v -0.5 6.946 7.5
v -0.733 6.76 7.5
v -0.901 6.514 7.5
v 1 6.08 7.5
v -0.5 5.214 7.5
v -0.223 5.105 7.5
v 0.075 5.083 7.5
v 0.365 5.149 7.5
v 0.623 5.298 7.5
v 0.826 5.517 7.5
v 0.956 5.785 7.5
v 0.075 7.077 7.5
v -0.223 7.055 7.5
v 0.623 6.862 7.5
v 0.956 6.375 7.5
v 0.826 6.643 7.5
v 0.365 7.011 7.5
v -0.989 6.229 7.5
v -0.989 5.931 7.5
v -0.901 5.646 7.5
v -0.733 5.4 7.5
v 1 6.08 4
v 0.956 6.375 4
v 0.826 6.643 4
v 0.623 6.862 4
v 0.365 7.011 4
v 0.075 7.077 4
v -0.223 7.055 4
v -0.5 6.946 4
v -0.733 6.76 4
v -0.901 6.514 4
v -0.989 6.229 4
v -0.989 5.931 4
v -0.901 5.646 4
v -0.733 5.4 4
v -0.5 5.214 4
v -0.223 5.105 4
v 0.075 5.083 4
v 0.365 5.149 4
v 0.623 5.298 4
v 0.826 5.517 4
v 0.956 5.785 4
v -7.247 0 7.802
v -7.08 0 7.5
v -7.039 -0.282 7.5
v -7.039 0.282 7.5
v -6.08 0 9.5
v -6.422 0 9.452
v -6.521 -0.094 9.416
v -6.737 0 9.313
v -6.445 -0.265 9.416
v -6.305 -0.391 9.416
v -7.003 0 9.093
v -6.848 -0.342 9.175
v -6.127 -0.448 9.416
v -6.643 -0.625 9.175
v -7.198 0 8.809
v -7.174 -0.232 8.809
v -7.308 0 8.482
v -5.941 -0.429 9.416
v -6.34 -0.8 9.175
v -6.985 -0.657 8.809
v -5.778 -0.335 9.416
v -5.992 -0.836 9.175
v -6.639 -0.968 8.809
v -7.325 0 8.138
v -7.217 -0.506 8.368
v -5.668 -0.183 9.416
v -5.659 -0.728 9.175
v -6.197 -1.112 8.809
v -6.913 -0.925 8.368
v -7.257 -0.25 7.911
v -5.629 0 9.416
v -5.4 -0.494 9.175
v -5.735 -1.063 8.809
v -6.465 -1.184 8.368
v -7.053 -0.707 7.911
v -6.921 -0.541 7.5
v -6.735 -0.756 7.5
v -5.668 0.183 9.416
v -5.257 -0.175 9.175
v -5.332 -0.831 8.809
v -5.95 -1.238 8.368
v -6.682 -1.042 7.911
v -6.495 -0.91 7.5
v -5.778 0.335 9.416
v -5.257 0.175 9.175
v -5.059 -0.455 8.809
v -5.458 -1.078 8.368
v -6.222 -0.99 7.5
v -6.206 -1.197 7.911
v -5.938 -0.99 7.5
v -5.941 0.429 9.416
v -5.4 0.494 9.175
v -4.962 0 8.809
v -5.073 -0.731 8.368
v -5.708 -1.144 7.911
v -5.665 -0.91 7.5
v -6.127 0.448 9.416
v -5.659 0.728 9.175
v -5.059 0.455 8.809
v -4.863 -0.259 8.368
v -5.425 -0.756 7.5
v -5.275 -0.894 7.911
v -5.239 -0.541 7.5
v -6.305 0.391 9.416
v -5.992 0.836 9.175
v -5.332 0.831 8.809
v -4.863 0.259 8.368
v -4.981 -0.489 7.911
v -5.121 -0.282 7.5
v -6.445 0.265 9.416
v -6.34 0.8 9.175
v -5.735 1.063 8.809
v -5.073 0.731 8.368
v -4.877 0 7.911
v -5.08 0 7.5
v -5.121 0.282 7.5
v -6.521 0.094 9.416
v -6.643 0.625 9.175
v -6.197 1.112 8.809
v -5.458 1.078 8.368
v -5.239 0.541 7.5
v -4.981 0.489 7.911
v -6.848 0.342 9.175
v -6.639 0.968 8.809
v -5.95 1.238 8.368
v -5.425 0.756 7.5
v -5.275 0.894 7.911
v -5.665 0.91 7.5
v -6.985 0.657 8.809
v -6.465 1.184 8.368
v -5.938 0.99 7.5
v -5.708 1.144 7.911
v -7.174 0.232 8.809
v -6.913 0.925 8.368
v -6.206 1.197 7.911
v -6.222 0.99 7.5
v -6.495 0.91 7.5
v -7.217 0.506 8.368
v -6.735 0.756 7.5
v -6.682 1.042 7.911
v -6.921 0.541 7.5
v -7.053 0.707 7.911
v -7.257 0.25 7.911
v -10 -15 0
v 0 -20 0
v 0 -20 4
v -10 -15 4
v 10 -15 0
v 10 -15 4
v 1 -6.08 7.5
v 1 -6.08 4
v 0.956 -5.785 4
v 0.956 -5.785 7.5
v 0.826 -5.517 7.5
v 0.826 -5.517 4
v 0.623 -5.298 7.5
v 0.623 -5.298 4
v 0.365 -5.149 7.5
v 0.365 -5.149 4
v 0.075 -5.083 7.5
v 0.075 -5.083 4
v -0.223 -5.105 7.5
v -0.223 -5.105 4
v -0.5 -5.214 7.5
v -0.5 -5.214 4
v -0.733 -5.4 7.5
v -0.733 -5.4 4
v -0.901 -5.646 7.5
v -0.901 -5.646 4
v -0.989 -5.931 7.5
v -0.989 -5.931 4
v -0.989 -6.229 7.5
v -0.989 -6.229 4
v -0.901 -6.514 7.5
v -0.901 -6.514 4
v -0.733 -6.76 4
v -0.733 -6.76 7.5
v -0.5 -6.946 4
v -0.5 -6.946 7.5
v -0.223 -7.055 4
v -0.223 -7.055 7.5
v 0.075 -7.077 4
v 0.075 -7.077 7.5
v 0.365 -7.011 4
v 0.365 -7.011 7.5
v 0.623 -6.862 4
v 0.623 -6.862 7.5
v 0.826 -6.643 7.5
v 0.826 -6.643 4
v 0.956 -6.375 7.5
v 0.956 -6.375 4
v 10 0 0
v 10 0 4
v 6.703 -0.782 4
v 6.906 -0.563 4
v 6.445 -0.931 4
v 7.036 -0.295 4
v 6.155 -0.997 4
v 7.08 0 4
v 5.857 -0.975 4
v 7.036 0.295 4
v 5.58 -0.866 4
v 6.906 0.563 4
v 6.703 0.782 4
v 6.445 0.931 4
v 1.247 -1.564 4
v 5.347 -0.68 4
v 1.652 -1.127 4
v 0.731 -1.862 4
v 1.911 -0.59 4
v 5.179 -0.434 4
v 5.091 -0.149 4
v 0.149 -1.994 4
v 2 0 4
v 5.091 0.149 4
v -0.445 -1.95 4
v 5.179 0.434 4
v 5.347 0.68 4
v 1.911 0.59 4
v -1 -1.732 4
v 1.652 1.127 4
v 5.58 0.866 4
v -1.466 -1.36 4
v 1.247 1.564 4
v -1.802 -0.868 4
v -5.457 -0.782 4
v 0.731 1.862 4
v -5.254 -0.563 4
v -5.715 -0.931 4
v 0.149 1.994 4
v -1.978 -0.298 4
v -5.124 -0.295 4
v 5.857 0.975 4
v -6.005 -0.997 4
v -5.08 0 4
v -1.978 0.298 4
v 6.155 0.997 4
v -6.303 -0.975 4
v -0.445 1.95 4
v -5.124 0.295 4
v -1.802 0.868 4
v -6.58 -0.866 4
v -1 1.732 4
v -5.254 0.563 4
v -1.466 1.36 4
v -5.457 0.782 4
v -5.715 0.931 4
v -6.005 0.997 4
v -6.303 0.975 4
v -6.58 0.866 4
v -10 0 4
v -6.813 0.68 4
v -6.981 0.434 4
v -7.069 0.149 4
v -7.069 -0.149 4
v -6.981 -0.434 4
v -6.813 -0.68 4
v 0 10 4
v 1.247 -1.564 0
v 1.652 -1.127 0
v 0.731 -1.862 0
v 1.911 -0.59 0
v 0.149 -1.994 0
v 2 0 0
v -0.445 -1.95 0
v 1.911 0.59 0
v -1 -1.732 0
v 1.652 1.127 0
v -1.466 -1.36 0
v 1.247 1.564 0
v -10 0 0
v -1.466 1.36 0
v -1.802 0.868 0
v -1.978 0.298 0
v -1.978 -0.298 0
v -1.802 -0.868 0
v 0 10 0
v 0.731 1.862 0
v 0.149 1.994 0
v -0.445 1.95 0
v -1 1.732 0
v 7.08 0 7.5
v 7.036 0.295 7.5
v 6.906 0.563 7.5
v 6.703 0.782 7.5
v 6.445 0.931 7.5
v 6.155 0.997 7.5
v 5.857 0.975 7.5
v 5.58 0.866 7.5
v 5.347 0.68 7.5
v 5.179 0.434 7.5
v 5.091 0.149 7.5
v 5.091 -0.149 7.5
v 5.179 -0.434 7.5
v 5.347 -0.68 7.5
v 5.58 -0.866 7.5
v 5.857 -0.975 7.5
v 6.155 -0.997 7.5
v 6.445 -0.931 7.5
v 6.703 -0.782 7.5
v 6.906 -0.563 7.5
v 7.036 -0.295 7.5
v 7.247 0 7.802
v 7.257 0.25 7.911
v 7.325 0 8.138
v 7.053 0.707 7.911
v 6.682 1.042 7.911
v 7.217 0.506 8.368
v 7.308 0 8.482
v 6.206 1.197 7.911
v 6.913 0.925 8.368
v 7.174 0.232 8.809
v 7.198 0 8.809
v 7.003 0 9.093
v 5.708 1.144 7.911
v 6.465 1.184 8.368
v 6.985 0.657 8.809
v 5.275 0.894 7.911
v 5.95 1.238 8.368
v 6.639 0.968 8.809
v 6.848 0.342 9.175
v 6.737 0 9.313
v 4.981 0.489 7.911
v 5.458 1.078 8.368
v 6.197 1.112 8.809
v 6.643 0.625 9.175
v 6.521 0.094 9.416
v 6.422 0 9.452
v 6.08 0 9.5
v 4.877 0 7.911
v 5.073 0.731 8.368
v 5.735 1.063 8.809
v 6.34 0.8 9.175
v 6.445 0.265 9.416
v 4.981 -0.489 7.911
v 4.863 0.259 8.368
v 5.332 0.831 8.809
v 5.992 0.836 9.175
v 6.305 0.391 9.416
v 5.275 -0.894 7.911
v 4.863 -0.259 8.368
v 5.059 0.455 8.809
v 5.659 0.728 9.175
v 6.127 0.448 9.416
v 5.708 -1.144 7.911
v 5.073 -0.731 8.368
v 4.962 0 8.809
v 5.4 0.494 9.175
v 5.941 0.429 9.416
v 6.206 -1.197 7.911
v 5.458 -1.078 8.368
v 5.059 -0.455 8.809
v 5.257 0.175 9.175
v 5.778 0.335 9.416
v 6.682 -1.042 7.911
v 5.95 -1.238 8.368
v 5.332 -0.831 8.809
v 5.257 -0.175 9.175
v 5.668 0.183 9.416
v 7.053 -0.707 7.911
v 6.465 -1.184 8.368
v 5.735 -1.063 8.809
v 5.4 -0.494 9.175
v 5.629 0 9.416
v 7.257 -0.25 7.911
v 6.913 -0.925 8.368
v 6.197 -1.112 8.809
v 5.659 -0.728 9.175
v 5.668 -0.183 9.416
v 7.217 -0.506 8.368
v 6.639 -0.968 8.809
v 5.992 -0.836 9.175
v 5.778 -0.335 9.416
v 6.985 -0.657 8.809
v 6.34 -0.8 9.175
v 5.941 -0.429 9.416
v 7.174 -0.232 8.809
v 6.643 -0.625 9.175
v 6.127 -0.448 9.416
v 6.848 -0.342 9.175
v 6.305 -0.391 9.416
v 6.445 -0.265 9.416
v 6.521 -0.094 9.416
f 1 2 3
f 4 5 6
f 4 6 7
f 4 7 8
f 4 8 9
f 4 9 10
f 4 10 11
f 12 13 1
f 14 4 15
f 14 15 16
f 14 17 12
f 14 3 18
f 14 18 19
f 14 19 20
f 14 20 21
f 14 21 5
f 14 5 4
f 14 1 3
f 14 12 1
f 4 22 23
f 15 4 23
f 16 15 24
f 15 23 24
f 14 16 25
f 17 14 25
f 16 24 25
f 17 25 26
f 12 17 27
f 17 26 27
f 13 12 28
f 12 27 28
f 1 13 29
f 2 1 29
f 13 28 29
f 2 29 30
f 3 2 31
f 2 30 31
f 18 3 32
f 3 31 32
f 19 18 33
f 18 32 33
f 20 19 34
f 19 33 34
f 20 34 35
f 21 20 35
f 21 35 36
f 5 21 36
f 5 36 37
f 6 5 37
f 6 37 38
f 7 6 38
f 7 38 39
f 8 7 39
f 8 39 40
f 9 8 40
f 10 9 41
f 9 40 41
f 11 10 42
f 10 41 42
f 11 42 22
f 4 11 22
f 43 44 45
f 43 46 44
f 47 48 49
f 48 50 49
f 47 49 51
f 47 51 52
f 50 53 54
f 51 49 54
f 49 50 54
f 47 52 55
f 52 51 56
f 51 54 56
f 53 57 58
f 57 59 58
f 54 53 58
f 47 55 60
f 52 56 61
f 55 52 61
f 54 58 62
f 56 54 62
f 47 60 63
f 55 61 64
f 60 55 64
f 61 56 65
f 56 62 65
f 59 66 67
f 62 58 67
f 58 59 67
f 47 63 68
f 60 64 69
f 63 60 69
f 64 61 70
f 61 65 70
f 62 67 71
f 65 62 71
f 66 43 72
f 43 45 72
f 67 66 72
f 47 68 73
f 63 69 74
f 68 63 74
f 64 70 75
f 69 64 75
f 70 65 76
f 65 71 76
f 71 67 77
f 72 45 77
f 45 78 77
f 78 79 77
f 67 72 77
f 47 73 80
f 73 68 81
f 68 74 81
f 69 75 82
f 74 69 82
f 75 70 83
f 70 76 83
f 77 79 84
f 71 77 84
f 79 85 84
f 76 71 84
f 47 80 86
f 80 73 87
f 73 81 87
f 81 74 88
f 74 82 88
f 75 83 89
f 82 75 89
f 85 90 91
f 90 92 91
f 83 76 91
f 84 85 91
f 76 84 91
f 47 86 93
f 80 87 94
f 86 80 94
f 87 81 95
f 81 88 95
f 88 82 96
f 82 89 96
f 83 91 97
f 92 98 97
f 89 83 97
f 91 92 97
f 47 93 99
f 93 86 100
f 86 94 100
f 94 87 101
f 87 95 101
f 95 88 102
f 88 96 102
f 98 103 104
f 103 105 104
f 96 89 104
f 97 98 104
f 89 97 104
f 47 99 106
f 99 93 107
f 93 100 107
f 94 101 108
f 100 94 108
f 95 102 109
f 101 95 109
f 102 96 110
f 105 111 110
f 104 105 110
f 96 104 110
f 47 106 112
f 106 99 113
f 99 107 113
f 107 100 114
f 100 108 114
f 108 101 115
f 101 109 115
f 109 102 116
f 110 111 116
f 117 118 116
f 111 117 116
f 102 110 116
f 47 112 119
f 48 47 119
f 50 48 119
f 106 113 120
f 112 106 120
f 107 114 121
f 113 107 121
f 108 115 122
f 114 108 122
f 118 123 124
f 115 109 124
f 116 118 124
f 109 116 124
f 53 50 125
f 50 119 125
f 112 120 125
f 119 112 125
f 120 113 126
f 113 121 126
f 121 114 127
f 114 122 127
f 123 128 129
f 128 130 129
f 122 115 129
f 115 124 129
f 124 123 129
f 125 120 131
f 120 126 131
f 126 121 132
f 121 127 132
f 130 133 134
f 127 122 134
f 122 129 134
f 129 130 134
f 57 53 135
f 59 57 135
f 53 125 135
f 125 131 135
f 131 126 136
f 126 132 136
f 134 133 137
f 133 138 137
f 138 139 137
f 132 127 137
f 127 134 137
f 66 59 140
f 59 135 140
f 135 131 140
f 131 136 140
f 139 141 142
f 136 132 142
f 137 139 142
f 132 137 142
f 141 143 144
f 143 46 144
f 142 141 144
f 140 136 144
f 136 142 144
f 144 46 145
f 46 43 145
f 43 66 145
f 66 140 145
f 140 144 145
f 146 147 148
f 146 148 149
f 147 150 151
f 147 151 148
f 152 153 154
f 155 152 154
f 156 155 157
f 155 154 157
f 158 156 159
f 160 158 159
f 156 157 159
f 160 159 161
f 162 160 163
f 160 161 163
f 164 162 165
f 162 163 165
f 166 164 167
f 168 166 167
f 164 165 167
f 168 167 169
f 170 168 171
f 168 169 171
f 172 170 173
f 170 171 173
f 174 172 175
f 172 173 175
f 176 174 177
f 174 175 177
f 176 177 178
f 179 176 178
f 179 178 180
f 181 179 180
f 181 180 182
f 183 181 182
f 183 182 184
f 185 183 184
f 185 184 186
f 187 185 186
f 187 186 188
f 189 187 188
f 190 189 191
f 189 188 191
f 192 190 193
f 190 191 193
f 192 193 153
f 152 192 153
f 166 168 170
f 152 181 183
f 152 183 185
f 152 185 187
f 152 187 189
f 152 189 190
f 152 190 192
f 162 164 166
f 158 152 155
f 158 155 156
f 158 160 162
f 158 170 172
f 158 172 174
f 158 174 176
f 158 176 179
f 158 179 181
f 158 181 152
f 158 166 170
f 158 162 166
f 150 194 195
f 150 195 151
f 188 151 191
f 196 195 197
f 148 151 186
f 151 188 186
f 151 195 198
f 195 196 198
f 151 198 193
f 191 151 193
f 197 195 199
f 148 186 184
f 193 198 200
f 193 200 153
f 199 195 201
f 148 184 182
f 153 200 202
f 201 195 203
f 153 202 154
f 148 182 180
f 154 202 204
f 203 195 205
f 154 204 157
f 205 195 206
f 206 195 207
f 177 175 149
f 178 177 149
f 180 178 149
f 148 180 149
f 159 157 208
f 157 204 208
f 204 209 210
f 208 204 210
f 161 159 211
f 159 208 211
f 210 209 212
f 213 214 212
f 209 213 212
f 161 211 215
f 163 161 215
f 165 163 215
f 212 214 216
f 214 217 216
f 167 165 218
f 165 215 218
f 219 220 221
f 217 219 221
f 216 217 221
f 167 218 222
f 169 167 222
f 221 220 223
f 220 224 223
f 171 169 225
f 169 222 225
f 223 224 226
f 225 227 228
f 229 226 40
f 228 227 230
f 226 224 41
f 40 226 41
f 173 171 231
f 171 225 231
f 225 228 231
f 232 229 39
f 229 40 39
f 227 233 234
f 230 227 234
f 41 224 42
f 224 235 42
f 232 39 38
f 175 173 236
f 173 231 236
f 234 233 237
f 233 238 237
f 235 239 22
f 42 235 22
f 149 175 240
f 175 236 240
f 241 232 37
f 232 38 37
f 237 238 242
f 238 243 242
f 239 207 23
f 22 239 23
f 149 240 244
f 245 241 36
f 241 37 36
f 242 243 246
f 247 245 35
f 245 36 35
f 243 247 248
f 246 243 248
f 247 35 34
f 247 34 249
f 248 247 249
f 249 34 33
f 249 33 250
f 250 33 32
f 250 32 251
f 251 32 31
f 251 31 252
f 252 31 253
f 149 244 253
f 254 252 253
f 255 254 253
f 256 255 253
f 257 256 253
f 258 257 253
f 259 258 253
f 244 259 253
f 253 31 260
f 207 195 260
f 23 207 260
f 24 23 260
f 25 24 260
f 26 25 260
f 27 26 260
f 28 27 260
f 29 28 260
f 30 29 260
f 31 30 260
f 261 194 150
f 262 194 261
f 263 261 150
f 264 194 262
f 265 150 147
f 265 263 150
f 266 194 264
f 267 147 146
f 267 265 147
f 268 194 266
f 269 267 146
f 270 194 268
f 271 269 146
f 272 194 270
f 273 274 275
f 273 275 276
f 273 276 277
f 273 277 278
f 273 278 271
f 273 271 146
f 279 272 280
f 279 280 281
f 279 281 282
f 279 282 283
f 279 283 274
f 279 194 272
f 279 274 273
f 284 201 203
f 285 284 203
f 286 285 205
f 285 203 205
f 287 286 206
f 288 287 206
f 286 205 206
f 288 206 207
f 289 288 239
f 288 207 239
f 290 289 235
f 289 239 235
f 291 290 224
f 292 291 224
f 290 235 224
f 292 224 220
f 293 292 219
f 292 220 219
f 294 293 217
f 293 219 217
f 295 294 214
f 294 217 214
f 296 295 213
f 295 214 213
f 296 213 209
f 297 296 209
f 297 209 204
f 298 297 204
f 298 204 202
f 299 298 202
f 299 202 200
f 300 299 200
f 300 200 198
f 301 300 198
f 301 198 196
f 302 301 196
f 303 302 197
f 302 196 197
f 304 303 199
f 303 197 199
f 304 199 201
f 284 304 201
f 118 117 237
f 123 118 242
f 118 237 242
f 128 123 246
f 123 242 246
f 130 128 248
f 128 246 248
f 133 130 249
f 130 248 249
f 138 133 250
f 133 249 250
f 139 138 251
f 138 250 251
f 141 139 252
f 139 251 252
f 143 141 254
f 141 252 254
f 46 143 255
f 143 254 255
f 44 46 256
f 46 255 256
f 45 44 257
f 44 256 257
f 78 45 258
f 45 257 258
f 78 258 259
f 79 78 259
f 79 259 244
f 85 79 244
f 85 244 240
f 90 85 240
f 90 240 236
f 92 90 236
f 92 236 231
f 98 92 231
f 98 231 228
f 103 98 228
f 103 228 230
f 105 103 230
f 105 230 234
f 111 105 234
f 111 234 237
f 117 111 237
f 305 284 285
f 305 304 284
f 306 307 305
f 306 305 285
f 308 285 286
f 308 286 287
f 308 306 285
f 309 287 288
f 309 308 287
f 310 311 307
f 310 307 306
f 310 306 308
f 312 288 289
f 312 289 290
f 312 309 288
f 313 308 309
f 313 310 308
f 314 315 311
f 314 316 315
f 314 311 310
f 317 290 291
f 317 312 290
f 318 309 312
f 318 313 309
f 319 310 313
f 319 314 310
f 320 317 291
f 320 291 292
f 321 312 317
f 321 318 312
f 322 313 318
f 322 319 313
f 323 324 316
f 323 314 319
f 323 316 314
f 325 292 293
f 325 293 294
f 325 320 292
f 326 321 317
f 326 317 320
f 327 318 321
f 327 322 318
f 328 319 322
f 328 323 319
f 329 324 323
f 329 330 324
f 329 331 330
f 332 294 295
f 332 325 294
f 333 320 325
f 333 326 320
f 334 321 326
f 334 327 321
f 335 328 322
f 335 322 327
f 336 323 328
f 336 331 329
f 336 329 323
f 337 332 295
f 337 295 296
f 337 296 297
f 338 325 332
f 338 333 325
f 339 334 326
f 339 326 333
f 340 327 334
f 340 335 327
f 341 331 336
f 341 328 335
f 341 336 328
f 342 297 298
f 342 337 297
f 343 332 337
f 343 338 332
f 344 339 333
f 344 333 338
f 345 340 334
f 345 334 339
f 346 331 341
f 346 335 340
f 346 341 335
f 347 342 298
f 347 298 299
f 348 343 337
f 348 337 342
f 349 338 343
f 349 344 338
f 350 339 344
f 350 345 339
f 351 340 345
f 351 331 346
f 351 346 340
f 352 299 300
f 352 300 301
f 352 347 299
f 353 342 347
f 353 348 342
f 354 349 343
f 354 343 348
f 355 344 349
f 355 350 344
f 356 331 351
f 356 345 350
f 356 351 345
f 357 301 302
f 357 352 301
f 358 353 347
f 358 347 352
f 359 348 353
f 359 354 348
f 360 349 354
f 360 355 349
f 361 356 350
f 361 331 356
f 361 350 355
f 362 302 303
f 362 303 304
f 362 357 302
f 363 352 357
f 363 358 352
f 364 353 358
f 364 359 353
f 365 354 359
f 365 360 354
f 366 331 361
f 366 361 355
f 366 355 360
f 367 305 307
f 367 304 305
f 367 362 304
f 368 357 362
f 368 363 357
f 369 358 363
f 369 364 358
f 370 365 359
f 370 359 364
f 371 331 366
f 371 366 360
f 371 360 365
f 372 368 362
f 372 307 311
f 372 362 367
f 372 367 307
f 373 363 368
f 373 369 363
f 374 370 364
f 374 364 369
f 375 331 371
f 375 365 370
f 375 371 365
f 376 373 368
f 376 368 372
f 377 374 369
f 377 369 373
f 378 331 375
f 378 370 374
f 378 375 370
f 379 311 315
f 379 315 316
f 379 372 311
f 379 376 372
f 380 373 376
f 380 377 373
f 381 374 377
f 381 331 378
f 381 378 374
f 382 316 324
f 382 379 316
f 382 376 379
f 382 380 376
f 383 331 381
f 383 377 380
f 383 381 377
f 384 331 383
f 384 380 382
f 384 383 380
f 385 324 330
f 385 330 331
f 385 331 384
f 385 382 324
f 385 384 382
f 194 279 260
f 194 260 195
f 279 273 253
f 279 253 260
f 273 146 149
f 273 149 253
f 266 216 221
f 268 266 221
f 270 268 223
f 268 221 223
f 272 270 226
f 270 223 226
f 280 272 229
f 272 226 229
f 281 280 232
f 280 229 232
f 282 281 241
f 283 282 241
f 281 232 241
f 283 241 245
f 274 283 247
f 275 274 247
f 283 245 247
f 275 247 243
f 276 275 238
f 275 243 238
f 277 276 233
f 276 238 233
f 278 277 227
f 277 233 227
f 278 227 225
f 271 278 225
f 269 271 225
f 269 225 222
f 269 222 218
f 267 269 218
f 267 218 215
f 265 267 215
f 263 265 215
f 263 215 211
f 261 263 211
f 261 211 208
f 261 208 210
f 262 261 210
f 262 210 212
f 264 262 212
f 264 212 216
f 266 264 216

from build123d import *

# Parameters (mm, degrees)
PAD_DEPTH    = 4
SKETCH001_R  = 2
POCKET_DEPTH = 5
SKETCH002_R  = 1
PAD001_DEPTH = 3.5


with BuildPart() as part:
    # Sketch → Pad (new body)
    with BuildSketch(Plane.XY):
        Polygon((-10, 0), (0, 10), (10, 0), (10, -15), (0, -20), (-10, -15), align=None)
    extrude(amount=PAD_DEPTH)

    # Sketch001 (on Face8 of Pad) → Pocket (cut)
    with BuildSketch(Plane.XY.offset(4)):
        Circle(SKETCH001_R)
    extrude(amount=-POCKET_DEPTH, mode=Mode.SUBTRACT)

    # Sketch002 (on Face5 of Pocket) → Pad001 (join)
    with BuildSketch(Plane.XY.offset(4)):
        with Locations((0, 6.08)):
            Circle(SKETCH002_R)
        with Locations((-6.08, 0)):
            Circle(SKETCH002_R)
        with Locations((6.08, 0)):
            Circle(SKETCH002_R)
        with Locations((0, -6.08)):
            Circle(SKETCH002_R)
    extrude(amount=PAD001_DEPTH)

    # Sketch006 → Revolution (revolve)
    with BuildSketch(Plane.XZ):
        with BuildLine():
            ThreePointArc((-6.08, 9.5), (-7.198034, 8.809017), (-7.08, 7.5))
            Line((-7.08, 7.5), (-6.08, 7.5))
            Line((-6.08, 7.5), (-6.08, 9.5))
        make_face()
    revolve(axis=Axis((-6.08, 0, 7.5), (0, 0, 1)))

    # Sketch008 → Revolution001 (revolve)
    with BuildSketch(Plane.XZ):
        with BuildLine():
            ThreePointArc((7.08, 7.5), (7.198034, 8.809017), (6.08, 9.5))
            Line((6.08, 7.5), (6.08, 9.5))
            Line((7.08, 7.5), (6.08, 7.5))
        make_face()
    revolve(axis=Axis((6.08, 0, 7.5), (0, 0, 1)))


solid = part.part
